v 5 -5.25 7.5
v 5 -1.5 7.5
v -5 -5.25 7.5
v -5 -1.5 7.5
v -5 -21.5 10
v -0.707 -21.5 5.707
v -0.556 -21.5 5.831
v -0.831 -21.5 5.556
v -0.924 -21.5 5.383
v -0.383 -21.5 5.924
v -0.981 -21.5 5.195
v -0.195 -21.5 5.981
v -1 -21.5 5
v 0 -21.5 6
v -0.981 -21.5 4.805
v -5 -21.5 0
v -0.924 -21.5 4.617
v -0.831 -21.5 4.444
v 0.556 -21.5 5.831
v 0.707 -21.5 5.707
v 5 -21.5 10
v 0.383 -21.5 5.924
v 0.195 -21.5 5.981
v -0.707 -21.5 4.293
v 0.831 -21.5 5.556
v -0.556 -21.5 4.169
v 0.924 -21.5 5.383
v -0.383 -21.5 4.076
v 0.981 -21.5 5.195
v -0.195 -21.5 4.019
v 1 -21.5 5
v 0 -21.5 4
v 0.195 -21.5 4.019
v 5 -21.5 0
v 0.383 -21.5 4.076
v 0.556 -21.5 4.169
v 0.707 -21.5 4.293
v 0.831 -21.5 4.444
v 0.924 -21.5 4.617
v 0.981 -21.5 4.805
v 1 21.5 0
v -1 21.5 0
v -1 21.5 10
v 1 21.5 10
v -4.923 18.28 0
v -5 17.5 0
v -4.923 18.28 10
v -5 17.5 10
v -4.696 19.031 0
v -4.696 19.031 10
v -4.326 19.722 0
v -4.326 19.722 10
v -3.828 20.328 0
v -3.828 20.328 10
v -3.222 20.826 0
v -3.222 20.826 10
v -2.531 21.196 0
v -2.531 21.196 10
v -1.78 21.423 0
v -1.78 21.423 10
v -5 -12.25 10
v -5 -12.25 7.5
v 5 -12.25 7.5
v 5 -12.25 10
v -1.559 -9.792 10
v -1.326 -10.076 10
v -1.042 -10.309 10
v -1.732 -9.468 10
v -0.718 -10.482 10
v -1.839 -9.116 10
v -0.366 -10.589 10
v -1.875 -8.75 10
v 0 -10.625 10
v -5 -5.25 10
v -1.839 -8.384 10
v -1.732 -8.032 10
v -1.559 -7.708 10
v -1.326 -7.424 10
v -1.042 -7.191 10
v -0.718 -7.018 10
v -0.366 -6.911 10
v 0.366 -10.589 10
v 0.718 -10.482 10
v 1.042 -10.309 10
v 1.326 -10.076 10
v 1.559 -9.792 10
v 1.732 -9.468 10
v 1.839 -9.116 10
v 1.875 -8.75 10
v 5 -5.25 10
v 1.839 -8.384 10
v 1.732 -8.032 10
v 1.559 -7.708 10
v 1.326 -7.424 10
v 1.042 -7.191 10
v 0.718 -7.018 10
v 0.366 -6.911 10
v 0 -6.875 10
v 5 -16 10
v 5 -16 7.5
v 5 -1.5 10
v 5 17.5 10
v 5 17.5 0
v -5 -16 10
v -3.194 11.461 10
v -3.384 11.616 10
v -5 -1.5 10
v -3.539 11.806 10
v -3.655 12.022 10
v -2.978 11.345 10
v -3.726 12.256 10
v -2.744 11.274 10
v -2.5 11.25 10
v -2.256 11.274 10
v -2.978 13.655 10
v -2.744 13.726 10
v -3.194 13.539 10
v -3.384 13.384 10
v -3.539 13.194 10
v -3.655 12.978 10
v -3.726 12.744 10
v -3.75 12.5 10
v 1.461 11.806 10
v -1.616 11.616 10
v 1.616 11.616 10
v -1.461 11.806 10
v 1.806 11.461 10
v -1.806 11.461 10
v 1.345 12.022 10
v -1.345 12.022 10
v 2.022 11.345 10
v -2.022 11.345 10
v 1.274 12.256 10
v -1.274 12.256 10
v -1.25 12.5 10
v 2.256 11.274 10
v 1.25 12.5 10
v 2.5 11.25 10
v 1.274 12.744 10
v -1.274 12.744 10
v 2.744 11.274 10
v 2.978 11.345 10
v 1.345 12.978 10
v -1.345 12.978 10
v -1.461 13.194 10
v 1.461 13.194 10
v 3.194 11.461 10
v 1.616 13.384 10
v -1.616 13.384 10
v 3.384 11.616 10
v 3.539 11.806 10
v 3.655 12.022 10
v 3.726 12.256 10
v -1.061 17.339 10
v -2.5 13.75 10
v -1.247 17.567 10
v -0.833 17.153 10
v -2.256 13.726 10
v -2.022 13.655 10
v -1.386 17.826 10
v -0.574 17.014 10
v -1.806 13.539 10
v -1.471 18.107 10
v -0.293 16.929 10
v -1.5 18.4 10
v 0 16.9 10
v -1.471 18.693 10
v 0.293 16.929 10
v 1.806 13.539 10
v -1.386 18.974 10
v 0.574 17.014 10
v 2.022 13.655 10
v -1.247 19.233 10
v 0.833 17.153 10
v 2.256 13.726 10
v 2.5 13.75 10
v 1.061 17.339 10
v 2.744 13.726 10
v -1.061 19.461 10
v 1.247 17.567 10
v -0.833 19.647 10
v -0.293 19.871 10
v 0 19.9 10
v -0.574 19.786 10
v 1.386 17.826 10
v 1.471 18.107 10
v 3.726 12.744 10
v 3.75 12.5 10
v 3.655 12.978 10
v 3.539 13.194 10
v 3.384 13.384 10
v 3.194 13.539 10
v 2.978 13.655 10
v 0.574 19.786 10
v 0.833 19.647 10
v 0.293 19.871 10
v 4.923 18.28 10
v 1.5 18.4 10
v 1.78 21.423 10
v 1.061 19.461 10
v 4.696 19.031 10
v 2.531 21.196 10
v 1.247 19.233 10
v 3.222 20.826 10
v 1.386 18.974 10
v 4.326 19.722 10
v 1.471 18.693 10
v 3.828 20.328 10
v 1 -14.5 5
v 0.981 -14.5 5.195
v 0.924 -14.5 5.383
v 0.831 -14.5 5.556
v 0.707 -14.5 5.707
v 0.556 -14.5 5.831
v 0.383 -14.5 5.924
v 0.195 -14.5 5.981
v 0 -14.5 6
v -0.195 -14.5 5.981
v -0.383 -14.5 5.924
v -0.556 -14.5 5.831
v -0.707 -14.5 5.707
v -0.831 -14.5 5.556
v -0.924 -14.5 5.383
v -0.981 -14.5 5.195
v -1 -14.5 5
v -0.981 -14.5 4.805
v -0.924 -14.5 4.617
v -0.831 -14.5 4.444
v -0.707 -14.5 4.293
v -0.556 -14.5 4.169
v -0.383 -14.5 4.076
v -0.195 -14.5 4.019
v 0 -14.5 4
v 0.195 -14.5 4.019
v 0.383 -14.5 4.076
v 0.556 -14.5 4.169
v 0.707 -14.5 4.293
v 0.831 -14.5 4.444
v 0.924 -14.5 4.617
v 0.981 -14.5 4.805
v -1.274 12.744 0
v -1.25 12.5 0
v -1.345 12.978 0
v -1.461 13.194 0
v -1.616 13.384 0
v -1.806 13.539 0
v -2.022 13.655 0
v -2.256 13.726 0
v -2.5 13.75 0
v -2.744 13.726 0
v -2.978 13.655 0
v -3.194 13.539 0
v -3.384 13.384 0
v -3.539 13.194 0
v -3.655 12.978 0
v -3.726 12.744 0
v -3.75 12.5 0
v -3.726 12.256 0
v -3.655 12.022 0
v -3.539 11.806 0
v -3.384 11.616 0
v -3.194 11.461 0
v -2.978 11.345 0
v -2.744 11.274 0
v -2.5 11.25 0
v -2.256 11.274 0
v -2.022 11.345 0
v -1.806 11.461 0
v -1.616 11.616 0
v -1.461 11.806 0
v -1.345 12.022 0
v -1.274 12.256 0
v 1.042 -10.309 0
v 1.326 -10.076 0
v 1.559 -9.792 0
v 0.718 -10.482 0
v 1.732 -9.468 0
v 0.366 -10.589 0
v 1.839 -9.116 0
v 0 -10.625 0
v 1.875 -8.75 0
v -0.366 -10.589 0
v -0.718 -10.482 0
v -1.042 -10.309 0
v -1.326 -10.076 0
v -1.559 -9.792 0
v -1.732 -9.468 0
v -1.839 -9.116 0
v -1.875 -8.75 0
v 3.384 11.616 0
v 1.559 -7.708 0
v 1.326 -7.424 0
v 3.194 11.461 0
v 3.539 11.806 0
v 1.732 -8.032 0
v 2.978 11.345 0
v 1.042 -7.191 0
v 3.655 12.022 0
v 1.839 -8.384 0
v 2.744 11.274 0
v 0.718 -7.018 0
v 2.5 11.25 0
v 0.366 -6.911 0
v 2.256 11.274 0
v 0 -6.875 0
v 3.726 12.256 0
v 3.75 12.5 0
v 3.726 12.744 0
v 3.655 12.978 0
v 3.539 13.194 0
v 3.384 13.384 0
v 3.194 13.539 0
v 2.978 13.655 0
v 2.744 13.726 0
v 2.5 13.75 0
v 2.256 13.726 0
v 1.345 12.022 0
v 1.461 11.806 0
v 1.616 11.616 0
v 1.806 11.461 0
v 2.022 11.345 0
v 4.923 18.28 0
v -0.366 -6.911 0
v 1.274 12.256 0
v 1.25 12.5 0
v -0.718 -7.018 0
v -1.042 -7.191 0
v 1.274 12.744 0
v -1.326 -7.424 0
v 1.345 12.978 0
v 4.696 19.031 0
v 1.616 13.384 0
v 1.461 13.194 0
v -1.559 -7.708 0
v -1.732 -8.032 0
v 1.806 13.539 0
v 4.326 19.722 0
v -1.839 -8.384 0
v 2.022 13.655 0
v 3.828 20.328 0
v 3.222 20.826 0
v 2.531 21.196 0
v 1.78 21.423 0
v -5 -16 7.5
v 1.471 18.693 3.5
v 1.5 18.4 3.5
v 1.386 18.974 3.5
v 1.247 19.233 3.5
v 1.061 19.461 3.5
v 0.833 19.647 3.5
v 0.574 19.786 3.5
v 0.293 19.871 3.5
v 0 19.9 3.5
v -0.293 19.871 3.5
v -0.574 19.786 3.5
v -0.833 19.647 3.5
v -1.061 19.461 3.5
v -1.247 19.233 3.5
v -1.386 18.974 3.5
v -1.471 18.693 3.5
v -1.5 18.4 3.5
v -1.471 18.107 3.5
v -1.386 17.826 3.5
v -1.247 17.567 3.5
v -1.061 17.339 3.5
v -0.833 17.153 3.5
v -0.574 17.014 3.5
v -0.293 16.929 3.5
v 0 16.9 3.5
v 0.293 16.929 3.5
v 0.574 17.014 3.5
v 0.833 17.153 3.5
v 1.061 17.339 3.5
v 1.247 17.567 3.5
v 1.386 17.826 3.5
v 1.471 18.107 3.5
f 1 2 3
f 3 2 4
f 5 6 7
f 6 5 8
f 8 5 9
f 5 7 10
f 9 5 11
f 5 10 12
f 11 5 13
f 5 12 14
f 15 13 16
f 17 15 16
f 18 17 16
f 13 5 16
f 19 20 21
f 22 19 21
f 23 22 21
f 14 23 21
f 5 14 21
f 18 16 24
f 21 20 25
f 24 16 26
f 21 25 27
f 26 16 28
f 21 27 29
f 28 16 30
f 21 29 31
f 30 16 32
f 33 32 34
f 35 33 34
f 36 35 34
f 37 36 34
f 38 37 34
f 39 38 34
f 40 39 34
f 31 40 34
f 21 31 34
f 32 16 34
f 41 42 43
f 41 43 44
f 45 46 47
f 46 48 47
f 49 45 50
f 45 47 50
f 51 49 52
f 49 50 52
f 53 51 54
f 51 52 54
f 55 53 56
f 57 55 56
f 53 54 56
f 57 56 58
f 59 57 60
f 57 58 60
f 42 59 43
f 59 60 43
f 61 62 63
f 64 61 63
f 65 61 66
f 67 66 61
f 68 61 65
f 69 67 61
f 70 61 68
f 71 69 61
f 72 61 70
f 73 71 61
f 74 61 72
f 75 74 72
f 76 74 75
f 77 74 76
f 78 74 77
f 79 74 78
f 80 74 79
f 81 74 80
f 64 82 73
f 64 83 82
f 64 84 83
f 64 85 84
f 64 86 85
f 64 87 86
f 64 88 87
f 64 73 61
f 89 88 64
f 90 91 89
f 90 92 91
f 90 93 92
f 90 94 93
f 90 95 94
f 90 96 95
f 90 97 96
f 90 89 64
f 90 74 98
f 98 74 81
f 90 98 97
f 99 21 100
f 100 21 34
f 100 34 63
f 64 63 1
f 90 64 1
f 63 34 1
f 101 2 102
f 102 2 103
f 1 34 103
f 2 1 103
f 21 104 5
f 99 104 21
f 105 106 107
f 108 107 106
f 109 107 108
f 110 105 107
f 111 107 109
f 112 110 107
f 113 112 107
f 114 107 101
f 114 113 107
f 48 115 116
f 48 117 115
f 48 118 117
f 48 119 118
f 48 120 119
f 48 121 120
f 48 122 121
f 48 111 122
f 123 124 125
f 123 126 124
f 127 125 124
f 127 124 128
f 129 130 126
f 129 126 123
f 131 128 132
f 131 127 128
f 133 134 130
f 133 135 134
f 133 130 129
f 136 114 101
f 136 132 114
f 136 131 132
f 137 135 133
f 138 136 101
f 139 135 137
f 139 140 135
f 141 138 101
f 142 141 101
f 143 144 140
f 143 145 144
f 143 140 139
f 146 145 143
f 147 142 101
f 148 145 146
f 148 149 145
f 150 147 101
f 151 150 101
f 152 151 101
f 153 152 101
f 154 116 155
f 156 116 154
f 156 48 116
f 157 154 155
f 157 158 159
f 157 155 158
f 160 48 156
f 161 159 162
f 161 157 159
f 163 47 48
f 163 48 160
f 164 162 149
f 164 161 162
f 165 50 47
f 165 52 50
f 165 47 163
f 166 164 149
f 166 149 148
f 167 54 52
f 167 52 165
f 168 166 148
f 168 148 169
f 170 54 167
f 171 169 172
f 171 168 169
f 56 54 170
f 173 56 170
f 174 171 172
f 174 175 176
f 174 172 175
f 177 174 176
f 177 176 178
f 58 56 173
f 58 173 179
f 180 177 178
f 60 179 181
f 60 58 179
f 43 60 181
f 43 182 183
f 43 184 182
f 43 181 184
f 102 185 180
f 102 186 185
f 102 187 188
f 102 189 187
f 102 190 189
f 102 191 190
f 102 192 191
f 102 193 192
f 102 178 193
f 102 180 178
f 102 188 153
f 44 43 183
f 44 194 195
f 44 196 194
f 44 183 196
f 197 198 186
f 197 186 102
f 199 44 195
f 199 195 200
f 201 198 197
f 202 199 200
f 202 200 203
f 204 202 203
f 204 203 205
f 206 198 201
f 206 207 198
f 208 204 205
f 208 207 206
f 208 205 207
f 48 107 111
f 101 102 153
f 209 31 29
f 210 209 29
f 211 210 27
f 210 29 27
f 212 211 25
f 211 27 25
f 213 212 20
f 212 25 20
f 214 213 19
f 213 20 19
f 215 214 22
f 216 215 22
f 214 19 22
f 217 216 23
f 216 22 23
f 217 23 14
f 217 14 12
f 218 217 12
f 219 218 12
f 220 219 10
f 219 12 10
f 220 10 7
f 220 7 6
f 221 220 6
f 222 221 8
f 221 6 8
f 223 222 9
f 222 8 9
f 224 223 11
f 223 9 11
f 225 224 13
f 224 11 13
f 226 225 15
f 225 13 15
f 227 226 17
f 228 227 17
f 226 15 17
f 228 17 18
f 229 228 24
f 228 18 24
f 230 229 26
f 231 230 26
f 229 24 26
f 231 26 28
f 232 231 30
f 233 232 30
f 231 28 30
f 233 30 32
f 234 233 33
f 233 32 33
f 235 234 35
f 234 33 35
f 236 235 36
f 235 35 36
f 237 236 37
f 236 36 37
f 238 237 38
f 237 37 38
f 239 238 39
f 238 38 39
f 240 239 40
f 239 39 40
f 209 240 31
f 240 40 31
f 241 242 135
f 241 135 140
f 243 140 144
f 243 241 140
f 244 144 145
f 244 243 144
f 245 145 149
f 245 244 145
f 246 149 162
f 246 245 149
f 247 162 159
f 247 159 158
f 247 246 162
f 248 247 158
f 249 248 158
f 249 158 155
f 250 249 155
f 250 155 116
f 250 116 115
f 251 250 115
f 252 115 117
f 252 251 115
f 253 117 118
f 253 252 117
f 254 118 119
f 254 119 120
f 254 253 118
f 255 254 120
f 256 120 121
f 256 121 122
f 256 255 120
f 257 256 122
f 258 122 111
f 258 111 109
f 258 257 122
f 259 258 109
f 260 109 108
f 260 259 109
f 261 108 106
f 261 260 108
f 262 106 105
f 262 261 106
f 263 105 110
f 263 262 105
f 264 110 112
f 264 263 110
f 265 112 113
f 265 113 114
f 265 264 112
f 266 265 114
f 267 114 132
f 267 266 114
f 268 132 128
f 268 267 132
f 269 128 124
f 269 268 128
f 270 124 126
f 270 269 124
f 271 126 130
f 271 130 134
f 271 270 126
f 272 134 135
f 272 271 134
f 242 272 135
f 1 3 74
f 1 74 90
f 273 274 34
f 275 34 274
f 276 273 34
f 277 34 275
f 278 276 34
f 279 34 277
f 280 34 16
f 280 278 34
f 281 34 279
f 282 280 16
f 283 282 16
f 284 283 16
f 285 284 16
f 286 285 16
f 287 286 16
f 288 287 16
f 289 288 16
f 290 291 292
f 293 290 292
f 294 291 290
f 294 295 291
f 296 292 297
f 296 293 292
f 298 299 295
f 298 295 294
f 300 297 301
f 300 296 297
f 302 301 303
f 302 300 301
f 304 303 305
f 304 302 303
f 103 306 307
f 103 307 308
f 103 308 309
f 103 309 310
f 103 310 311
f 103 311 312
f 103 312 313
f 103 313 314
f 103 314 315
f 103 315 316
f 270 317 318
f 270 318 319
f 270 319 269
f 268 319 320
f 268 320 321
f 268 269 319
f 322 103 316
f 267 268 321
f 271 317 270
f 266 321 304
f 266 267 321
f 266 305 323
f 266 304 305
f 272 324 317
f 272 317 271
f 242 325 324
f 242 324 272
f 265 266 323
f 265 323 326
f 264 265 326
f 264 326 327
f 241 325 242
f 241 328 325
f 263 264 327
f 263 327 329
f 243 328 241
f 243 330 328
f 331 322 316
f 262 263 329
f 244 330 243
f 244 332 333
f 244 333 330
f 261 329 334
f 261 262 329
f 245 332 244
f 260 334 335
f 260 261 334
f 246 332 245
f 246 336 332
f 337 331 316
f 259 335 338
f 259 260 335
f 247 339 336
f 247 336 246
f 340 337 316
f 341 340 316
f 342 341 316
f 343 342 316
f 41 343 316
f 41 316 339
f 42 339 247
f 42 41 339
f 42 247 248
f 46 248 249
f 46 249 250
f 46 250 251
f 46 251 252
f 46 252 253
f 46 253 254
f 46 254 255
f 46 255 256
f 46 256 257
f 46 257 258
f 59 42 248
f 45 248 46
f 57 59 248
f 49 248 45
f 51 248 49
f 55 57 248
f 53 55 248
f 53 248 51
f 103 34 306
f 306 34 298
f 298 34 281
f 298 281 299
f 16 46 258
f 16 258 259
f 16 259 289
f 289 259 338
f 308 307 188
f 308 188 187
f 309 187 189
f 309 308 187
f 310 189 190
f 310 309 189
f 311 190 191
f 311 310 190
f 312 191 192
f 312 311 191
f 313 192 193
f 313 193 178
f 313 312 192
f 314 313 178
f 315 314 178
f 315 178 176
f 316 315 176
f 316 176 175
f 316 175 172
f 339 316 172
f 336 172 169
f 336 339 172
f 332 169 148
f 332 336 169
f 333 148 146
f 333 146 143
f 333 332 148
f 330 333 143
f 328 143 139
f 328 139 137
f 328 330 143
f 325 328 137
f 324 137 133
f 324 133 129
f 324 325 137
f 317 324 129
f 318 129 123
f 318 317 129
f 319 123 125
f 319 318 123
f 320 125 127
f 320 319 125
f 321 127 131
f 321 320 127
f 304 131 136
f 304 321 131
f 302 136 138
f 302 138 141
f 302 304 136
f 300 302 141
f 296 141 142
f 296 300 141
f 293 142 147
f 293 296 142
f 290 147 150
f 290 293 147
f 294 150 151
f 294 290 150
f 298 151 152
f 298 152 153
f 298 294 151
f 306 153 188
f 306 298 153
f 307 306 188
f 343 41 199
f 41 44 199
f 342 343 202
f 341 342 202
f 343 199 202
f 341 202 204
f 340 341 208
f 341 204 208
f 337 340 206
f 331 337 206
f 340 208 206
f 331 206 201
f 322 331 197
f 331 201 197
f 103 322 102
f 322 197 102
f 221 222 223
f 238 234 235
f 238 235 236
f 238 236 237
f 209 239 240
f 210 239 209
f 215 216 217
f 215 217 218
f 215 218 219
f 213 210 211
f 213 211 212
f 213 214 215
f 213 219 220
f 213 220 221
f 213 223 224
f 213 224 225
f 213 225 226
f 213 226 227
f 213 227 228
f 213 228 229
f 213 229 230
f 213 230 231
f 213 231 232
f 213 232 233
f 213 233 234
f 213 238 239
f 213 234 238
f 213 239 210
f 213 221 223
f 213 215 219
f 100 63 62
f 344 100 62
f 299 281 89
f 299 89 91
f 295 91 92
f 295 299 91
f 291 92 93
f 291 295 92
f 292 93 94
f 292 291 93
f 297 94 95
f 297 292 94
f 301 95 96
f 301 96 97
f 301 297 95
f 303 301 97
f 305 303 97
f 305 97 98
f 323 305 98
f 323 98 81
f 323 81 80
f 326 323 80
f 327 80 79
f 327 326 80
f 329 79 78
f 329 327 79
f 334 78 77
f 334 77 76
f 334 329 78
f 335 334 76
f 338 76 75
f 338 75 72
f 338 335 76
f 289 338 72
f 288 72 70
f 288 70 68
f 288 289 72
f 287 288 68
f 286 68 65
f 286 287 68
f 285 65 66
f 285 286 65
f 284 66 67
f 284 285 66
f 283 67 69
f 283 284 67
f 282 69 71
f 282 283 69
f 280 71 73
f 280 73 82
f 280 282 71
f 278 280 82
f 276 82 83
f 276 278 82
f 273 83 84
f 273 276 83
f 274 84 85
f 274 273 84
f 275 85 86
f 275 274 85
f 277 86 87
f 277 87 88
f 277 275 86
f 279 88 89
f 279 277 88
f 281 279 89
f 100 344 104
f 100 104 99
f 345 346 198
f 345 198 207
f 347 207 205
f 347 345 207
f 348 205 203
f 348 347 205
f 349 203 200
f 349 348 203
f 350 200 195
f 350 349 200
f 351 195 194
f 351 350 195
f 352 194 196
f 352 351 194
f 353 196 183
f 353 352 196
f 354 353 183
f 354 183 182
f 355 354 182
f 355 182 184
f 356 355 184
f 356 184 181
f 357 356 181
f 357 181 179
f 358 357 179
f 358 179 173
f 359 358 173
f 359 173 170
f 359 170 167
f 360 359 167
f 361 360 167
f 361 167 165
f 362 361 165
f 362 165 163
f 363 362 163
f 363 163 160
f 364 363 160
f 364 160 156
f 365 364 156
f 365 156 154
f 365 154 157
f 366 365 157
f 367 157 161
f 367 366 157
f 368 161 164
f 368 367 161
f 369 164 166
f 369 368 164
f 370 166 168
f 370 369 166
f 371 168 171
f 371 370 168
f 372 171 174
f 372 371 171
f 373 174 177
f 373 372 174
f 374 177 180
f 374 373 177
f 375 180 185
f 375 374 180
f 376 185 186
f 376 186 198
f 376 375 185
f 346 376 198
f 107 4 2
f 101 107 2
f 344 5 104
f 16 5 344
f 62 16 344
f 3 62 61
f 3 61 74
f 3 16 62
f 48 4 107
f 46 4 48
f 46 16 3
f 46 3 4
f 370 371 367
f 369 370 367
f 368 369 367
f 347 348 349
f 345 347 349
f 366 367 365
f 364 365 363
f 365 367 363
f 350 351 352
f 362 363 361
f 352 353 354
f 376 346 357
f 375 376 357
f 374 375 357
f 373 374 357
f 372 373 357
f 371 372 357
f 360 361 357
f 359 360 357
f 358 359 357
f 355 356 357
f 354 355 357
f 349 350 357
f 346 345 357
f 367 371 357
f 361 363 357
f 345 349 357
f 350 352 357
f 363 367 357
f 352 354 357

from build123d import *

# Parameters (mm, degrees)
SKETCH1_W             = 10
SKETCH1_H             = 23
SKETCH1_R             = 1.25
SKETCH1_R_2           = 1.5
BOSS_EXTRUDE1_DEPTH   = 10
SKETCH1_H_2           = 7
SKETCH1_R_3           = 1.875
BOSS_EXTRUDE1_2_DEPTH = 10
SKETCH1_H_3           = 5.5
BOSS_EXTRUDE1_3_DEPTH = 10
FILLET1_R             = 4
SKETCH2_R             = 1.536328734
BOSS_EXTRUDE3_DEPTH   = 3.5
SKETCH3_W             = 10
SKETCH3_H             = 3.920500842
BOSS_EXTRUDE4_DEPTH   = 7.5
SKETCH4_W             = 10
SKETCH4_H             = 3.773973311
BOSS_EXTRUDE5_DEPTH   = 7.5
SKETCH5_R             = 1
CUT_EXTRUDE1_DEPTH    = 7


with BuildPart() as part:
    # Sketch1 → Boss-Extrude1 (new body)
    with BuildSketch(Plane.XY):
        with Locations((0, 10)):
            Rectangle(SKETCH1_W, SKETCH1_H)
        with Locations((-2.5, 12.5)):
            Circle(SKETCH1_R, mode=Mode.SUBTRACT)
        with Locations((0, 18.4)):
            Circle(SKETCH1_R_2, mode=Mode.SUBTRACT)
        with Locations((2.5, 12.5)):
            Circle(SKETCH1_R, mode=Mode.SUBTRACT)
    extrude(amount=BOSS_EXTRUDE1_DEPTH)

    # Fillet1
    fillet1_edges = [part.edges().sort_by_distance(p)[0] for p in [
        (-5, 21.5, 5),
        (5, 21.5, 5),
    ]]
    fillet(fillet1_edges, radius=FILLET1_R)

    # Sketch2 → Boss-Extrude3 (add)
    with BuildSketch(Plane(origin=(0, 0, 0), x_dir=(-1, 0, 0), z_dir=(0, 0, -1))):
        with Locations((0, 18.4)):
            Circle(SKETCH2_R)
    extrude(amount=-BOSS_EXTRUDE3_DEPTH)



with BuildPart() as body_2:
    # Sketch1 → Boss-Extrude1 2 (new body)
    with BuildSketch(Plane.XY):
        with Locations((0, -8.75)):
            Rectangle(SKETCH1_W, SKETCH1_H_2)
        with Locations((0, -8.75)):
            Circle(SKETCH1_R_3, mode=Mode.SUBTRACT)
    extrude(amount=BOSS_EXTRUDE1_2_DEPTH)


with BuildPart() as body_3:
    # Sketch1 → Boss-Extrude1 3 (new body)
    with BuildSketch(Plane.XY):
        with Locations((0, -18.75)):
            Rectangle(SKETCH1_W, SKETCH1_H_3)
    extrude(amount=BOSS_EXTRUDE1_3_DEPTH)


with BuildPart() as part_1:
    add(part.part)

    add(body_2.part)  # Boss-Extrude4 merges body 2
    # Sketch3 → Boss-Extrude4 (add)
    with BuildSketch(Plane(origin=(0, 0, 0), x_dir=(-1, 0, 0), z_dir=(0, 0, -1))):
        with Locations((0, -3.289749579)):
            Rectangle(SKETCH3_W, SKETCH3_H)
    extrude(amount=-BOSS_EXTRUDE4_DEPTH)


    add(body_3.part)  # Boss-Extrude5 merges body 3
    # Sketch4 → Boss-Extrude5 (add)
    with BuildSketch(Plane(origin=(0, 0, 0), x_dir=(-1, 0, 0), z_dir=(0, 0, -1))):
        with Locations((0, -14.113013345)):
            Rectangle(SKETCH4_W, SKETCH4_H)
    extrude(amount=-BOSS_EXTRUDE5_DEPTH)

    # Sketch5 → Cut-Extrude1 (cut)
    with BuildSketch(Plane.XZ.offset(21.5)):
        with Locations((0, 5)):
            Circle(SKETCH5_R)
    extrude(amount=-CUT_EXTRUDE1_DEPTH, mode=Mode.SUBTRACT)


solid = part_1.part
